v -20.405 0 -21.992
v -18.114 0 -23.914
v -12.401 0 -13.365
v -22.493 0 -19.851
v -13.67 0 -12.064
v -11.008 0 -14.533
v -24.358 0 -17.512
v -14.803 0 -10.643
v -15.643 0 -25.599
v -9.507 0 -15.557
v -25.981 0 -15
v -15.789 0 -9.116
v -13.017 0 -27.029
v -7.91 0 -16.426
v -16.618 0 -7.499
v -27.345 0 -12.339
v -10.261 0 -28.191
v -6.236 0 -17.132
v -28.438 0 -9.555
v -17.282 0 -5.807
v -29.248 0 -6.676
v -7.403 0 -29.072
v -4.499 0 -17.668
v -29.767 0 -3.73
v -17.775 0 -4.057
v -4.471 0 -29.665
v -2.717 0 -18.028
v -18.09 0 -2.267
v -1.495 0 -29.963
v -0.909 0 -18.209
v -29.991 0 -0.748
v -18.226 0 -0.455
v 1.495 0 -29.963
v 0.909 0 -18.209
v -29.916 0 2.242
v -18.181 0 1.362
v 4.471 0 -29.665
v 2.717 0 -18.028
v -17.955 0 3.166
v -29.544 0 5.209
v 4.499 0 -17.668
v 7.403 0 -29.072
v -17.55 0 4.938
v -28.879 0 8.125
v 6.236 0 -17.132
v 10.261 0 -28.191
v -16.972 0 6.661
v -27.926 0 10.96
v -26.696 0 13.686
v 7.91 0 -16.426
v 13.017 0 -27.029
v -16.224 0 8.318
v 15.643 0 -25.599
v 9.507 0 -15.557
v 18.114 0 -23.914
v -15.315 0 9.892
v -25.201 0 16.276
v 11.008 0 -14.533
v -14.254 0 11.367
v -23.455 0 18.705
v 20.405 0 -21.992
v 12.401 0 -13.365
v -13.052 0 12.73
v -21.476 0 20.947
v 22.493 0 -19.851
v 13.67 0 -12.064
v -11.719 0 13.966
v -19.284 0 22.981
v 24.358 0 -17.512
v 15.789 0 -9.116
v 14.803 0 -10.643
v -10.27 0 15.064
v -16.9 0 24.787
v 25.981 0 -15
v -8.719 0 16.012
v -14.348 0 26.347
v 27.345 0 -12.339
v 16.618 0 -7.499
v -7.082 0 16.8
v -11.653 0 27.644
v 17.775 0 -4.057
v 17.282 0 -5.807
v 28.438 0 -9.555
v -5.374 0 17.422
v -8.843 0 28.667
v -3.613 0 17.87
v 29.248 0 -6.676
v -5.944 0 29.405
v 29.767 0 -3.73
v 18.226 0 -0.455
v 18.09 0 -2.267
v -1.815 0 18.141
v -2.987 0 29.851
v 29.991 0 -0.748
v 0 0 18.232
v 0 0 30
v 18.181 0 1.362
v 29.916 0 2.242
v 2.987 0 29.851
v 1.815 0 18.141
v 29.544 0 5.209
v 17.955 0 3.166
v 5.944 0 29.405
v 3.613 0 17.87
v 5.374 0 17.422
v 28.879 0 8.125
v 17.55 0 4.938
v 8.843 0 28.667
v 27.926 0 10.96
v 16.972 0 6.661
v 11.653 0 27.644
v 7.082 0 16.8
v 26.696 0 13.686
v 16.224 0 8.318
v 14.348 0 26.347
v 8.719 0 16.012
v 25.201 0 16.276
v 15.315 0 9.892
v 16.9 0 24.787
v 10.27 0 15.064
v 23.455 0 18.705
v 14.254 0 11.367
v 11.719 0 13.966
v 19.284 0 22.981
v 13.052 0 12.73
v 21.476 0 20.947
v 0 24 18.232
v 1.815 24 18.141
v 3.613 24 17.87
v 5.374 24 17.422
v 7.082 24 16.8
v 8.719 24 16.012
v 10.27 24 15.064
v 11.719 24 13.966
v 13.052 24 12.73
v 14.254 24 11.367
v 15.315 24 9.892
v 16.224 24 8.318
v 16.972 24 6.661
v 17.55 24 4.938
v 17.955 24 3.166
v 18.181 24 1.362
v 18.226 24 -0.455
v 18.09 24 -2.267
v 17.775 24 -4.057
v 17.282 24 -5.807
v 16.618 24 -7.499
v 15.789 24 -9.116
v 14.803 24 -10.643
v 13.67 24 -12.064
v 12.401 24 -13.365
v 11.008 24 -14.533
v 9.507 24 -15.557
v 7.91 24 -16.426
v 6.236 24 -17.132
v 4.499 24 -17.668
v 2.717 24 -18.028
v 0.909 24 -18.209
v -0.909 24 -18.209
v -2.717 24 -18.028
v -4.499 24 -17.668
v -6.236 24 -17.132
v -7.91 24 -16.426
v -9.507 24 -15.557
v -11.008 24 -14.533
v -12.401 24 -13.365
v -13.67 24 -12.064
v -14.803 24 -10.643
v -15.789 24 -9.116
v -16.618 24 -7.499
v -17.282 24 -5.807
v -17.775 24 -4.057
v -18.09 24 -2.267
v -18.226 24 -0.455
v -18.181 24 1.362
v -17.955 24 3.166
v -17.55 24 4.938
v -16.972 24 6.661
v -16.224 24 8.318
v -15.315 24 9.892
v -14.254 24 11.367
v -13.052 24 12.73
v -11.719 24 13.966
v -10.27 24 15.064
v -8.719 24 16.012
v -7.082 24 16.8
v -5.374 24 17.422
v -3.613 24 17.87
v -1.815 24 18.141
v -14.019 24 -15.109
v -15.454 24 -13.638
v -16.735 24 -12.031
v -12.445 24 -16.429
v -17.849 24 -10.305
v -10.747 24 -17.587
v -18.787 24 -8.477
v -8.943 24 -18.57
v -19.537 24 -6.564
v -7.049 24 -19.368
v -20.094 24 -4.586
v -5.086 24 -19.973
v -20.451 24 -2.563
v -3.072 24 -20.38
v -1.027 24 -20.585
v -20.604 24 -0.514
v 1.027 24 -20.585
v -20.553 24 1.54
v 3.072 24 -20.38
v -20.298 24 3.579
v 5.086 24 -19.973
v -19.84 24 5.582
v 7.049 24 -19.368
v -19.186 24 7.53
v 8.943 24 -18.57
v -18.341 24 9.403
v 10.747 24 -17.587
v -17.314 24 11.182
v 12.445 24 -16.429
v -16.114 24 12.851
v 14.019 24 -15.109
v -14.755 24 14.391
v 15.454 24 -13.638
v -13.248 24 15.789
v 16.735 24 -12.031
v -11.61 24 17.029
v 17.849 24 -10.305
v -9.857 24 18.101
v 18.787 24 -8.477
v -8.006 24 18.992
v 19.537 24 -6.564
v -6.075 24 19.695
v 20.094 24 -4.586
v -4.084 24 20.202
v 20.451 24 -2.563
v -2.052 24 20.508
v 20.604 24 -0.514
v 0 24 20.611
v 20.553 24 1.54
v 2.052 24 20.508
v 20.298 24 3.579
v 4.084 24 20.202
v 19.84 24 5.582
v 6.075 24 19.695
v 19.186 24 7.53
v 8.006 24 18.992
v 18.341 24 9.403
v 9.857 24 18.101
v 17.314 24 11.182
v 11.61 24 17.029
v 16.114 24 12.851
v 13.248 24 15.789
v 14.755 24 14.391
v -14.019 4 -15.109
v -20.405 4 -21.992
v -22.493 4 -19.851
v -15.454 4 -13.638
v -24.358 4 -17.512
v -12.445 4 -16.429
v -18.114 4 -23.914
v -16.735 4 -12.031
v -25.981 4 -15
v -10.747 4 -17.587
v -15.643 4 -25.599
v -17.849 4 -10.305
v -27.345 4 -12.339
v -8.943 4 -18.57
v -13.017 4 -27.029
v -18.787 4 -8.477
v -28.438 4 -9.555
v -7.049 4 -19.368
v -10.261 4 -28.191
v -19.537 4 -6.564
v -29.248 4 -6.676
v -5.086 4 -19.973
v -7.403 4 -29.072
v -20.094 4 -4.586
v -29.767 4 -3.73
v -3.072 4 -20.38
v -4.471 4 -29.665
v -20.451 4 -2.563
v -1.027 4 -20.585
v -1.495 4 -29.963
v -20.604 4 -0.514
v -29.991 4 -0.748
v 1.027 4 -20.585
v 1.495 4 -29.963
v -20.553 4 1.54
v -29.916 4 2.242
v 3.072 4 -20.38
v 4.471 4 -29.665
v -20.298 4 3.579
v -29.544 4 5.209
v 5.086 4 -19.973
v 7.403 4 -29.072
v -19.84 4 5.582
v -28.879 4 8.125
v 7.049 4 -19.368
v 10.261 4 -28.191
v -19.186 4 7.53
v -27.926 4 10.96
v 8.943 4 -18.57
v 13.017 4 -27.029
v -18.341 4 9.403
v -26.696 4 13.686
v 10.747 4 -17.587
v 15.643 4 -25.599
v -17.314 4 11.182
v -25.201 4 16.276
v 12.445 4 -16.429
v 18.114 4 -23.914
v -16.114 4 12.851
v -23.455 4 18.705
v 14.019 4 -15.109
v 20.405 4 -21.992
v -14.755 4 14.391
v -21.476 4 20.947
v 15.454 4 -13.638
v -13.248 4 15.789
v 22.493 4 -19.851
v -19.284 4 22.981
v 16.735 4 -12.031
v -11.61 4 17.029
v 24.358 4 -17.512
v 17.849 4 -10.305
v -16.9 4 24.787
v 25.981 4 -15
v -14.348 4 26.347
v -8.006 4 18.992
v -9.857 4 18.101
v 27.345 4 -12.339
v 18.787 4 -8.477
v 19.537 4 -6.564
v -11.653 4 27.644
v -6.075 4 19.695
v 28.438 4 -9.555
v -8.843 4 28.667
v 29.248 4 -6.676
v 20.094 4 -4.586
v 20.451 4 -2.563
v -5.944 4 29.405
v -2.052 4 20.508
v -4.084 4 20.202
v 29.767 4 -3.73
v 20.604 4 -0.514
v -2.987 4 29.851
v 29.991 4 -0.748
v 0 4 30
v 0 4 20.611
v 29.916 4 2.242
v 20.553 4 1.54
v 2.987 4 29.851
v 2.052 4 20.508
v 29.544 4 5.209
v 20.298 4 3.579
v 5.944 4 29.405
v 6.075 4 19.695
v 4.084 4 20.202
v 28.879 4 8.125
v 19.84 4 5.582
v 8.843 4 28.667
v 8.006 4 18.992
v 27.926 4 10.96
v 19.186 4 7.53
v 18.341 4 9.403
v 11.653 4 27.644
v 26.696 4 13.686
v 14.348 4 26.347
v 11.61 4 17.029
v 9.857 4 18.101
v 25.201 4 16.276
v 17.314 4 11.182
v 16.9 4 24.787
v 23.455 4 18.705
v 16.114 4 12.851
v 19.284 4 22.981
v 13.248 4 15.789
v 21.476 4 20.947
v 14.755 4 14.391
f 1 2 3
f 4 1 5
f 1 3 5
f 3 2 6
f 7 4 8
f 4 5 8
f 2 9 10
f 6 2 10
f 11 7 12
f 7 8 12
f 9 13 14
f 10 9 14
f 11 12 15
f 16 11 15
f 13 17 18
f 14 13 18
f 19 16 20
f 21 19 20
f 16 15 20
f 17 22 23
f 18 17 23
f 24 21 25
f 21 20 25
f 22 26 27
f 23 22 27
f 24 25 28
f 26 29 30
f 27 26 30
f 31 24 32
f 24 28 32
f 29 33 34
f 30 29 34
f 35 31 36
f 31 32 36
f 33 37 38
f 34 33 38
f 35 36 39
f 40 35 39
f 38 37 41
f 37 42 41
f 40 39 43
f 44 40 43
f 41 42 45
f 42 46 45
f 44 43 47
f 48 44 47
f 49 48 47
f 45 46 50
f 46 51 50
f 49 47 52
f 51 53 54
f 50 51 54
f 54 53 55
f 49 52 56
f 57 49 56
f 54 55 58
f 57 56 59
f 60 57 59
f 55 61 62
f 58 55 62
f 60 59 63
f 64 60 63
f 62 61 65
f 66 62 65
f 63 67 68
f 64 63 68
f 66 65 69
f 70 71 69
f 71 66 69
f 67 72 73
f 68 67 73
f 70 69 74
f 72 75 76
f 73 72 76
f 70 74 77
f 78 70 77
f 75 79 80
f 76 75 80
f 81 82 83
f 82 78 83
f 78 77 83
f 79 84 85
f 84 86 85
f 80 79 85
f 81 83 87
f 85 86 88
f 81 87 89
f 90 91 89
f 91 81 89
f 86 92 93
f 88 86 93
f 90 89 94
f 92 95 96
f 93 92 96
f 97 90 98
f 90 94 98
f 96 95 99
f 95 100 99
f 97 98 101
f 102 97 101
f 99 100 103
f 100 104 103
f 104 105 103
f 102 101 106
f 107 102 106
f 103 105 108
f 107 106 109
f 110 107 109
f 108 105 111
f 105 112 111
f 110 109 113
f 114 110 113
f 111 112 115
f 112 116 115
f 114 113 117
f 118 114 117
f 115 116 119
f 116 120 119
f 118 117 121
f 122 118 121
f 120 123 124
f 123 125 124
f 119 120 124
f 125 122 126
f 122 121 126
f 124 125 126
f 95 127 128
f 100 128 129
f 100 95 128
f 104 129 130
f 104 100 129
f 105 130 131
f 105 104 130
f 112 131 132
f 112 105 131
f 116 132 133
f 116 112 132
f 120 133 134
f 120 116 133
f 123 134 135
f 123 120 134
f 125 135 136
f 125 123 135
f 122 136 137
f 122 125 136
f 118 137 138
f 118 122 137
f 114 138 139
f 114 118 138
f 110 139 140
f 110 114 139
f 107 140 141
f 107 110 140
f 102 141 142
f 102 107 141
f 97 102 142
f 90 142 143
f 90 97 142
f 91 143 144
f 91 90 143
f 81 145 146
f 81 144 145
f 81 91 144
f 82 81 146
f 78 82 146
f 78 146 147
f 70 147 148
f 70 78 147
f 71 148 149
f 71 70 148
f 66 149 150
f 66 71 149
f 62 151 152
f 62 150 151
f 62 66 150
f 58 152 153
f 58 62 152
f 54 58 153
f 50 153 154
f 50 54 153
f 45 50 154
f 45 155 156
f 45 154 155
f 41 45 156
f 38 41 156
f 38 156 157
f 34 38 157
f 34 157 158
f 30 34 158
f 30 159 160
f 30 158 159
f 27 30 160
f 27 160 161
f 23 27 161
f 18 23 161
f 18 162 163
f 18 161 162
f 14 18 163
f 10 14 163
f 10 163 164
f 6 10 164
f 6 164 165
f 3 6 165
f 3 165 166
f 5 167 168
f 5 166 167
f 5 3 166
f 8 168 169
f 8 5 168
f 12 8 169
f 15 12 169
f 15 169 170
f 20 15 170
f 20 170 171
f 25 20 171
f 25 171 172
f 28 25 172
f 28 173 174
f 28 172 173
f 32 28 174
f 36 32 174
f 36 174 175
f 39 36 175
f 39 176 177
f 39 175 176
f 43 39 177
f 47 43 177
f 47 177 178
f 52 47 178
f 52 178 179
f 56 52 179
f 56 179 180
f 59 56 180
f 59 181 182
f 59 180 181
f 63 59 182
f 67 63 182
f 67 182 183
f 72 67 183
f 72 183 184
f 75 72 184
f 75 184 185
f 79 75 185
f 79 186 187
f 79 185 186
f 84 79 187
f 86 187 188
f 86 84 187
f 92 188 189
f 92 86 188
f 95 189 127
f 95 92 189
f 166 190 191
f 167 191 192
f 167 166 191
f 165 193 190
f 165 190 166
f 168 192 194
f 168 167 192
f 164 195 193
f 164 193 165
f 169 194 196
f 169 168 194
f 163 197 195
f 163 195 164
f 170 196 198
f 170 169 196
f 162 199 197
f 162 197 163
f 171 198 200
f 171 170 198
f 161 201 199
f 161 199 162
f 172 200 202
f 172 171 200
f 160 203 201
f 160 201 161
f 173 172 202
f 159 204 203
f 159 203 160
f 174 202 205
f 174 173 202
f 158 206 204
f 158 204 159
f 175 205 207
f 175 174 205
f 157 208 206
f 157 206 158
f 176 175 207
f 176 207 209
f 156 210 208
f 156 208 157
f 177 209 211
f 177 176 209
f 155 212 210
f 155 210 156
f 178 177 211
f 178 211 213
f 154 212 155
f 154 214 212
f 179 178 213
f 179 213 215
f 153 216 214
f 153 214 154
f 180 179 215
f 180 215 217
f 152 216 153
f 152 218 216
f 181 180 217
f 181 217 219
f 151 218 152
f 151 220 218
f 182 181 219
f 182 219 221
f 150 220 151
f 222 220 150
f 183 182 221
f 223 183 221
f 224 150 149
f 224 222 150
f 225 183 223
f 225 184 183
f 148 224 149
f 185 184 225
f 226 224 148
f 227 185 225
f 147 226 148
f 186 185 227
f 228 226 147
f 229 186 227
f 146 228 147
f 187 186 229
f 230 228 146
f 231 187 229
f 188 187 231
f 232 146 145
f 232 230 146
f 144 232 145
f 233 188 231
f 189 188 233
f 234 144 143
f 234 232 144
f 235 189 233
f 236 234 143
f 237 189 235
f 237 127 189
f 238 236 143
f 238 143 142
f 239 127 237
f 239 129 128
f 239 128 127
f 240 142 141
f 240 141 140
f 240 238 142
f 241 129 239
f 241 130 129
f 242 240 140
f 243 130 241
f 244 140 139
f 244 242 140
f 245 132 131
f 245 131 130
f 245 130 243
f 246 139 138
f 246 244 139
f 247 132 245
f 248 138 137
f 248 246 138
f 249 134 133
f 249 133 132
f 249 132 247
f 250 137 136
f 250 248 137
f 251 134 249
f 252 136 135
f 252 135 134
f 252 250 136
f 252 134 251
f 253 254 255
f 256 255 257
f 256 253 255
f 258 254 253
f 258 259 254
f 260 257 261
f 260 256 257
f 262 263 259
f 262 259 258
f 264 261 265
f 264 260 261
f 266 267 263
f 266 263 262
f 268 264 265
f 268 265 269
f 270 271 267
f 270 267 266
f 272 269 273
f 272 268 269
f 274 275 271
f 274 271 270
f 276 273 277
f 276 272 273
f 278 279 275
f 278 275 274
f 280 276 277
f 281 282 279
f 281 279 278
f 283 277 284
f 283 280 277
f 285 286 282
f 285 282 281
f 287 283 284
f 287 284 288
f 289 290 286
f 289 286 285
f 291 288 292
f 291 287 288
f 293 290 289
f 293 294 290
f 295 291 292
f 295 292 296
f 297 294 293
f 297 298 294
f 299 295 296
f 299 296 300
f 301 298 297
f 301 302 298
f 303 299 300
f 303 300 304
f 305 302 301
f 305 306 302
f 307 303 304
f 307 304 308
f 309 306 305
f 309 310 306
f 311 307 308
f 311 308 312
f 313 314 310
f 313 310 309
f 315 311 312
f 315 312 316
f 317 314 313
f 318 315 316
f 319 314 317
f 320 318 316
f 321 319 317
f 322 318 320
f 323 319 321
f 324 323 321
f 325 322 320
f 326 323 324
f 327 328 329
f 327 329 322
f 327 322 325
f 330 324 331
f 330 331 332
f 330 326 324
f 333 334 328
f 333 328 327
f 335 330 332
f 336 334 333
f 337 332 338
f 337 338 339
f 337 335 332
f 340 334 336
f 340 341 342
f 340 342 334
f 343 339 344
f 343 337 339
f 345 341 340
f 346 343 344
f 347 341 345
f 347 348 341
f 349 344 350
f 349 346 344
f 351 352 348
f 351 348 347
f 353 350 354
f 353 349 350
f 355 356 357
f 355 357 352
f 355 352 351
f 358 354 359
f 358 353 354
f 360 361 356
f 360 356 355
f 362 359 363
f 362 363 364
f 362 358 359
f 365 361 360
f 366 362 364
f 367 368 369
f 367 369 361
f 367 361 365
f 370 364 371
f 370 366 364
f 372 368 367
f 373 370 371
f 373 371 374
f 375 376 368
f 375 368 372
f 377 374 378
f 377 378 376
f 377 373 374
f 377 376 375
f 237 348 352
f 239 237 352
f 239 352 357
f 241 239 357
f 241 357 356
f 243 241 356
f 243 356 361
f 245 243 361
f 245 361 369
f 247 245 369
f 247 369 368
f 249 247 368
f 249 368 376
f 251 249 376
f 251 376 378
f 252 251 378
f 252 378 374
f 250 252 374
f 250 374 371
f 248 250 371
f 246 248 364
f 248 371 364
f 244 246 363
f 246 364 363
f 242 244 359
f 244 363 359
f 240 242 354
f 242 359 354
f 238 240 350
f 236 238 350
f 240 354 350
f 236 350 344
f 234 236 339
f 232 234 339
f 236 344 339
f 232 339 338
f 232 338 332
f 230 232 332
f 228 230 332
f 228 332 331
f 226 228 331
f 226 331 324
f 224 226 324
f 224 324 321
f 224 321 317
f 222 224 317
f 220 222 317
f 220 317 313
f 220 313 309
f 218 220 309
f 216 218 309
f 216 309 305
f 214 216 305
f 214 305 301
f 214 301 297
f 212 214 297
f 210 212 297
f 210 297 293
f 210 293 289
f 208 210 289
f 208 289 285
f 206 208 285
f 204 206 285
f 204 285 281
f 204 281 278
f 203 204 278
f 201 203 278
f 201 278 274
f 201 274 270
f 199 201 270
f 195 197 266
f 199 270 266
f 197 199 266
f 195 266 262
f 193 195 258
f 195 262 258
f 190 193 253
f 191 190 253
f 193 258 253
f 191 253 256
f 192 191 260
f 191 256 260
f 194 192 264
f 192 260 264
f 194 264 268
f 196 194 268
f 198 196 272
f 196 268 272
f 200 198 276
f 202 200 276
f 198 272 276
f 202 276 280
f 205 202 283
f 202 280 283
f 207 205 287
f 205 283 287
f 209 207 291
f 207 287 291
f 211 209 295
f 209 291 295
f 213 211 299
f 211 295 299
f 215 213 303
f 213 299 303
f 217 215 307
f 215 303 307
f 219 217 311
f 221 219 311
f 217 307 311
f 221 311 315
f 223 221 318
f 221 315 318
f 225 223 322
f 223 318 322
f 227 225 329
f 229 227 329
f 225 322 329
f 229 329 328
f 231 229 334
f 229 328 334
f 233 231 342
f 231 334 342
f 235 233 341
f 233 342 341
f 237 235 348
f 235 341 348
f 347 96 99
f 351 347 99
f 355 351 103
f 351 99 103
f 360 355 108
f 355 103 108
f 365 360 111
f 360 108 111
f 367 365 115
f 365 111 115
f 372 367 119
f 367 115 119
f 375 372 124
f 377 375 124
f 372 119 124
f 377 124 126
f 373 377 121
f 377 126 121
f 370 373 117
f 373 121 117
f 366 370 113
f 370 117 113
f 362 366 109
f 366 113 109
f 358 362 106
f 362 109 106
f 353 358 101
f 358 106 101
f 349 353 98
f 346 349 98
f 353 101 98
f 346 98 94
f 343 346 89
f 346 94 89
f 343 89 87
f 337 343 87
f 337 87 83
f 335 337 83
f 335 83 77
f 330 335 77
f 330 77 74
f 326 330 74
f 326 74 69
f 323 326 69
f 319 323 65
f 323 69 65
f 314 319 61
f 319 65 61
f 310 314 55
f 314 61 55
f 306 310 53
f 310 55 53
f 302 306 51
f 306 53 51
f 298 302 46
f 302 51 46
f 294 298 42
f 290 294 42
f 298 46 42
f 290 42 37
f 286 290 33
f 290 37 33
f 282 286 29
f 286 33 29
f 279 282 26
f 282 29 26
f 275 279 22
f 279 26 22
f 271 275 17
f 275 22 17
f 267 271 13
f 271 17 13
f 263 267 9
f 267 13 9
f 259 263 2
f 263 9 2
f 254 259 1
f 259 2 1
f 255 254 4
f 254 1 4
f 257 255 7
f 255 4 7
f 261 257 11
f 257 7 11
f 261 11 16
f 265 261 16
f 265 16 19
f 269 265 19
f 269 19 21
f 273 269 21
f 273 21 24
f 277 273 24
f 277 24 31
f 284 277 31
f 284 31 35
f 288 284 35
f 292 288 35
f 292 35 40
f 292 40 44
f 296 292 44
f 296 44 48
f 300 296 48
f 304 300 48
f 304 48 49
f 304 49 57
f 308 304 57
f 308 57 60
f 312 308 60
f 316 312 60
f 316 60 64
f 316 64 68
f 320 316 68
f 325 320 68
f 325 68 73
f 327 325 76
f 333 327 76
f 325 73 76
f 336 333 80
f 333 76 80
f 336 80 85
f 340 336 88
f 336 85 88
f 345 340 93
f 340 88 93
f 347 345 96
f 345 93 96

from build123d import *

# Parameters (mm, degrees)
SKETCH1_R           = 30
BOSS_EXTRUDE1_DEPTH = 4
SKETCH1_3_R         = 20.610704172
BOSS_EXTRUDE2_DEPTH = 24
SKETCH1_6_R         = 18.231835924
CUT_EXTRUDE1_DEPTH  = 49.744230428


with BuildPart() as part:
    # Sketch1 → Boss-Extrude1 (new body)
    with BuildSketch(Plane(origin=(0, 0, 0), x_dir=(1, 0, 0), z_dir=(0, 1, 0))):
        Circle(SKETCH1_R)
    extrude(amount=BOSS_EXTRUDE1_DEPTH)

    # Sketch1<3> → Boss-Extrude2 (add)
    with BuildSketch(Plane(origin=(0, 0, 0), x_dir=(1, 0, 0), z_dir=(0, 1, 0))):
        Circle(SKETCH1_3_R)
    extrude(amount=BOSS_EXTRUDE2_DEPTH)

    # Sketch1<6> → Cut-Extrude1 (cut, through all)
    with BuildSketch(Plane(origin=(0, 0, 0), x_dir=(1, 0, 0), z_dir=(0, 1, 0))):
        Circle(SKETCH1_6_R)
    extrude(amount=CUT_EXTRUDE1_DEPTH, mode=Mode.SUBTRACT)


solid = part.part
